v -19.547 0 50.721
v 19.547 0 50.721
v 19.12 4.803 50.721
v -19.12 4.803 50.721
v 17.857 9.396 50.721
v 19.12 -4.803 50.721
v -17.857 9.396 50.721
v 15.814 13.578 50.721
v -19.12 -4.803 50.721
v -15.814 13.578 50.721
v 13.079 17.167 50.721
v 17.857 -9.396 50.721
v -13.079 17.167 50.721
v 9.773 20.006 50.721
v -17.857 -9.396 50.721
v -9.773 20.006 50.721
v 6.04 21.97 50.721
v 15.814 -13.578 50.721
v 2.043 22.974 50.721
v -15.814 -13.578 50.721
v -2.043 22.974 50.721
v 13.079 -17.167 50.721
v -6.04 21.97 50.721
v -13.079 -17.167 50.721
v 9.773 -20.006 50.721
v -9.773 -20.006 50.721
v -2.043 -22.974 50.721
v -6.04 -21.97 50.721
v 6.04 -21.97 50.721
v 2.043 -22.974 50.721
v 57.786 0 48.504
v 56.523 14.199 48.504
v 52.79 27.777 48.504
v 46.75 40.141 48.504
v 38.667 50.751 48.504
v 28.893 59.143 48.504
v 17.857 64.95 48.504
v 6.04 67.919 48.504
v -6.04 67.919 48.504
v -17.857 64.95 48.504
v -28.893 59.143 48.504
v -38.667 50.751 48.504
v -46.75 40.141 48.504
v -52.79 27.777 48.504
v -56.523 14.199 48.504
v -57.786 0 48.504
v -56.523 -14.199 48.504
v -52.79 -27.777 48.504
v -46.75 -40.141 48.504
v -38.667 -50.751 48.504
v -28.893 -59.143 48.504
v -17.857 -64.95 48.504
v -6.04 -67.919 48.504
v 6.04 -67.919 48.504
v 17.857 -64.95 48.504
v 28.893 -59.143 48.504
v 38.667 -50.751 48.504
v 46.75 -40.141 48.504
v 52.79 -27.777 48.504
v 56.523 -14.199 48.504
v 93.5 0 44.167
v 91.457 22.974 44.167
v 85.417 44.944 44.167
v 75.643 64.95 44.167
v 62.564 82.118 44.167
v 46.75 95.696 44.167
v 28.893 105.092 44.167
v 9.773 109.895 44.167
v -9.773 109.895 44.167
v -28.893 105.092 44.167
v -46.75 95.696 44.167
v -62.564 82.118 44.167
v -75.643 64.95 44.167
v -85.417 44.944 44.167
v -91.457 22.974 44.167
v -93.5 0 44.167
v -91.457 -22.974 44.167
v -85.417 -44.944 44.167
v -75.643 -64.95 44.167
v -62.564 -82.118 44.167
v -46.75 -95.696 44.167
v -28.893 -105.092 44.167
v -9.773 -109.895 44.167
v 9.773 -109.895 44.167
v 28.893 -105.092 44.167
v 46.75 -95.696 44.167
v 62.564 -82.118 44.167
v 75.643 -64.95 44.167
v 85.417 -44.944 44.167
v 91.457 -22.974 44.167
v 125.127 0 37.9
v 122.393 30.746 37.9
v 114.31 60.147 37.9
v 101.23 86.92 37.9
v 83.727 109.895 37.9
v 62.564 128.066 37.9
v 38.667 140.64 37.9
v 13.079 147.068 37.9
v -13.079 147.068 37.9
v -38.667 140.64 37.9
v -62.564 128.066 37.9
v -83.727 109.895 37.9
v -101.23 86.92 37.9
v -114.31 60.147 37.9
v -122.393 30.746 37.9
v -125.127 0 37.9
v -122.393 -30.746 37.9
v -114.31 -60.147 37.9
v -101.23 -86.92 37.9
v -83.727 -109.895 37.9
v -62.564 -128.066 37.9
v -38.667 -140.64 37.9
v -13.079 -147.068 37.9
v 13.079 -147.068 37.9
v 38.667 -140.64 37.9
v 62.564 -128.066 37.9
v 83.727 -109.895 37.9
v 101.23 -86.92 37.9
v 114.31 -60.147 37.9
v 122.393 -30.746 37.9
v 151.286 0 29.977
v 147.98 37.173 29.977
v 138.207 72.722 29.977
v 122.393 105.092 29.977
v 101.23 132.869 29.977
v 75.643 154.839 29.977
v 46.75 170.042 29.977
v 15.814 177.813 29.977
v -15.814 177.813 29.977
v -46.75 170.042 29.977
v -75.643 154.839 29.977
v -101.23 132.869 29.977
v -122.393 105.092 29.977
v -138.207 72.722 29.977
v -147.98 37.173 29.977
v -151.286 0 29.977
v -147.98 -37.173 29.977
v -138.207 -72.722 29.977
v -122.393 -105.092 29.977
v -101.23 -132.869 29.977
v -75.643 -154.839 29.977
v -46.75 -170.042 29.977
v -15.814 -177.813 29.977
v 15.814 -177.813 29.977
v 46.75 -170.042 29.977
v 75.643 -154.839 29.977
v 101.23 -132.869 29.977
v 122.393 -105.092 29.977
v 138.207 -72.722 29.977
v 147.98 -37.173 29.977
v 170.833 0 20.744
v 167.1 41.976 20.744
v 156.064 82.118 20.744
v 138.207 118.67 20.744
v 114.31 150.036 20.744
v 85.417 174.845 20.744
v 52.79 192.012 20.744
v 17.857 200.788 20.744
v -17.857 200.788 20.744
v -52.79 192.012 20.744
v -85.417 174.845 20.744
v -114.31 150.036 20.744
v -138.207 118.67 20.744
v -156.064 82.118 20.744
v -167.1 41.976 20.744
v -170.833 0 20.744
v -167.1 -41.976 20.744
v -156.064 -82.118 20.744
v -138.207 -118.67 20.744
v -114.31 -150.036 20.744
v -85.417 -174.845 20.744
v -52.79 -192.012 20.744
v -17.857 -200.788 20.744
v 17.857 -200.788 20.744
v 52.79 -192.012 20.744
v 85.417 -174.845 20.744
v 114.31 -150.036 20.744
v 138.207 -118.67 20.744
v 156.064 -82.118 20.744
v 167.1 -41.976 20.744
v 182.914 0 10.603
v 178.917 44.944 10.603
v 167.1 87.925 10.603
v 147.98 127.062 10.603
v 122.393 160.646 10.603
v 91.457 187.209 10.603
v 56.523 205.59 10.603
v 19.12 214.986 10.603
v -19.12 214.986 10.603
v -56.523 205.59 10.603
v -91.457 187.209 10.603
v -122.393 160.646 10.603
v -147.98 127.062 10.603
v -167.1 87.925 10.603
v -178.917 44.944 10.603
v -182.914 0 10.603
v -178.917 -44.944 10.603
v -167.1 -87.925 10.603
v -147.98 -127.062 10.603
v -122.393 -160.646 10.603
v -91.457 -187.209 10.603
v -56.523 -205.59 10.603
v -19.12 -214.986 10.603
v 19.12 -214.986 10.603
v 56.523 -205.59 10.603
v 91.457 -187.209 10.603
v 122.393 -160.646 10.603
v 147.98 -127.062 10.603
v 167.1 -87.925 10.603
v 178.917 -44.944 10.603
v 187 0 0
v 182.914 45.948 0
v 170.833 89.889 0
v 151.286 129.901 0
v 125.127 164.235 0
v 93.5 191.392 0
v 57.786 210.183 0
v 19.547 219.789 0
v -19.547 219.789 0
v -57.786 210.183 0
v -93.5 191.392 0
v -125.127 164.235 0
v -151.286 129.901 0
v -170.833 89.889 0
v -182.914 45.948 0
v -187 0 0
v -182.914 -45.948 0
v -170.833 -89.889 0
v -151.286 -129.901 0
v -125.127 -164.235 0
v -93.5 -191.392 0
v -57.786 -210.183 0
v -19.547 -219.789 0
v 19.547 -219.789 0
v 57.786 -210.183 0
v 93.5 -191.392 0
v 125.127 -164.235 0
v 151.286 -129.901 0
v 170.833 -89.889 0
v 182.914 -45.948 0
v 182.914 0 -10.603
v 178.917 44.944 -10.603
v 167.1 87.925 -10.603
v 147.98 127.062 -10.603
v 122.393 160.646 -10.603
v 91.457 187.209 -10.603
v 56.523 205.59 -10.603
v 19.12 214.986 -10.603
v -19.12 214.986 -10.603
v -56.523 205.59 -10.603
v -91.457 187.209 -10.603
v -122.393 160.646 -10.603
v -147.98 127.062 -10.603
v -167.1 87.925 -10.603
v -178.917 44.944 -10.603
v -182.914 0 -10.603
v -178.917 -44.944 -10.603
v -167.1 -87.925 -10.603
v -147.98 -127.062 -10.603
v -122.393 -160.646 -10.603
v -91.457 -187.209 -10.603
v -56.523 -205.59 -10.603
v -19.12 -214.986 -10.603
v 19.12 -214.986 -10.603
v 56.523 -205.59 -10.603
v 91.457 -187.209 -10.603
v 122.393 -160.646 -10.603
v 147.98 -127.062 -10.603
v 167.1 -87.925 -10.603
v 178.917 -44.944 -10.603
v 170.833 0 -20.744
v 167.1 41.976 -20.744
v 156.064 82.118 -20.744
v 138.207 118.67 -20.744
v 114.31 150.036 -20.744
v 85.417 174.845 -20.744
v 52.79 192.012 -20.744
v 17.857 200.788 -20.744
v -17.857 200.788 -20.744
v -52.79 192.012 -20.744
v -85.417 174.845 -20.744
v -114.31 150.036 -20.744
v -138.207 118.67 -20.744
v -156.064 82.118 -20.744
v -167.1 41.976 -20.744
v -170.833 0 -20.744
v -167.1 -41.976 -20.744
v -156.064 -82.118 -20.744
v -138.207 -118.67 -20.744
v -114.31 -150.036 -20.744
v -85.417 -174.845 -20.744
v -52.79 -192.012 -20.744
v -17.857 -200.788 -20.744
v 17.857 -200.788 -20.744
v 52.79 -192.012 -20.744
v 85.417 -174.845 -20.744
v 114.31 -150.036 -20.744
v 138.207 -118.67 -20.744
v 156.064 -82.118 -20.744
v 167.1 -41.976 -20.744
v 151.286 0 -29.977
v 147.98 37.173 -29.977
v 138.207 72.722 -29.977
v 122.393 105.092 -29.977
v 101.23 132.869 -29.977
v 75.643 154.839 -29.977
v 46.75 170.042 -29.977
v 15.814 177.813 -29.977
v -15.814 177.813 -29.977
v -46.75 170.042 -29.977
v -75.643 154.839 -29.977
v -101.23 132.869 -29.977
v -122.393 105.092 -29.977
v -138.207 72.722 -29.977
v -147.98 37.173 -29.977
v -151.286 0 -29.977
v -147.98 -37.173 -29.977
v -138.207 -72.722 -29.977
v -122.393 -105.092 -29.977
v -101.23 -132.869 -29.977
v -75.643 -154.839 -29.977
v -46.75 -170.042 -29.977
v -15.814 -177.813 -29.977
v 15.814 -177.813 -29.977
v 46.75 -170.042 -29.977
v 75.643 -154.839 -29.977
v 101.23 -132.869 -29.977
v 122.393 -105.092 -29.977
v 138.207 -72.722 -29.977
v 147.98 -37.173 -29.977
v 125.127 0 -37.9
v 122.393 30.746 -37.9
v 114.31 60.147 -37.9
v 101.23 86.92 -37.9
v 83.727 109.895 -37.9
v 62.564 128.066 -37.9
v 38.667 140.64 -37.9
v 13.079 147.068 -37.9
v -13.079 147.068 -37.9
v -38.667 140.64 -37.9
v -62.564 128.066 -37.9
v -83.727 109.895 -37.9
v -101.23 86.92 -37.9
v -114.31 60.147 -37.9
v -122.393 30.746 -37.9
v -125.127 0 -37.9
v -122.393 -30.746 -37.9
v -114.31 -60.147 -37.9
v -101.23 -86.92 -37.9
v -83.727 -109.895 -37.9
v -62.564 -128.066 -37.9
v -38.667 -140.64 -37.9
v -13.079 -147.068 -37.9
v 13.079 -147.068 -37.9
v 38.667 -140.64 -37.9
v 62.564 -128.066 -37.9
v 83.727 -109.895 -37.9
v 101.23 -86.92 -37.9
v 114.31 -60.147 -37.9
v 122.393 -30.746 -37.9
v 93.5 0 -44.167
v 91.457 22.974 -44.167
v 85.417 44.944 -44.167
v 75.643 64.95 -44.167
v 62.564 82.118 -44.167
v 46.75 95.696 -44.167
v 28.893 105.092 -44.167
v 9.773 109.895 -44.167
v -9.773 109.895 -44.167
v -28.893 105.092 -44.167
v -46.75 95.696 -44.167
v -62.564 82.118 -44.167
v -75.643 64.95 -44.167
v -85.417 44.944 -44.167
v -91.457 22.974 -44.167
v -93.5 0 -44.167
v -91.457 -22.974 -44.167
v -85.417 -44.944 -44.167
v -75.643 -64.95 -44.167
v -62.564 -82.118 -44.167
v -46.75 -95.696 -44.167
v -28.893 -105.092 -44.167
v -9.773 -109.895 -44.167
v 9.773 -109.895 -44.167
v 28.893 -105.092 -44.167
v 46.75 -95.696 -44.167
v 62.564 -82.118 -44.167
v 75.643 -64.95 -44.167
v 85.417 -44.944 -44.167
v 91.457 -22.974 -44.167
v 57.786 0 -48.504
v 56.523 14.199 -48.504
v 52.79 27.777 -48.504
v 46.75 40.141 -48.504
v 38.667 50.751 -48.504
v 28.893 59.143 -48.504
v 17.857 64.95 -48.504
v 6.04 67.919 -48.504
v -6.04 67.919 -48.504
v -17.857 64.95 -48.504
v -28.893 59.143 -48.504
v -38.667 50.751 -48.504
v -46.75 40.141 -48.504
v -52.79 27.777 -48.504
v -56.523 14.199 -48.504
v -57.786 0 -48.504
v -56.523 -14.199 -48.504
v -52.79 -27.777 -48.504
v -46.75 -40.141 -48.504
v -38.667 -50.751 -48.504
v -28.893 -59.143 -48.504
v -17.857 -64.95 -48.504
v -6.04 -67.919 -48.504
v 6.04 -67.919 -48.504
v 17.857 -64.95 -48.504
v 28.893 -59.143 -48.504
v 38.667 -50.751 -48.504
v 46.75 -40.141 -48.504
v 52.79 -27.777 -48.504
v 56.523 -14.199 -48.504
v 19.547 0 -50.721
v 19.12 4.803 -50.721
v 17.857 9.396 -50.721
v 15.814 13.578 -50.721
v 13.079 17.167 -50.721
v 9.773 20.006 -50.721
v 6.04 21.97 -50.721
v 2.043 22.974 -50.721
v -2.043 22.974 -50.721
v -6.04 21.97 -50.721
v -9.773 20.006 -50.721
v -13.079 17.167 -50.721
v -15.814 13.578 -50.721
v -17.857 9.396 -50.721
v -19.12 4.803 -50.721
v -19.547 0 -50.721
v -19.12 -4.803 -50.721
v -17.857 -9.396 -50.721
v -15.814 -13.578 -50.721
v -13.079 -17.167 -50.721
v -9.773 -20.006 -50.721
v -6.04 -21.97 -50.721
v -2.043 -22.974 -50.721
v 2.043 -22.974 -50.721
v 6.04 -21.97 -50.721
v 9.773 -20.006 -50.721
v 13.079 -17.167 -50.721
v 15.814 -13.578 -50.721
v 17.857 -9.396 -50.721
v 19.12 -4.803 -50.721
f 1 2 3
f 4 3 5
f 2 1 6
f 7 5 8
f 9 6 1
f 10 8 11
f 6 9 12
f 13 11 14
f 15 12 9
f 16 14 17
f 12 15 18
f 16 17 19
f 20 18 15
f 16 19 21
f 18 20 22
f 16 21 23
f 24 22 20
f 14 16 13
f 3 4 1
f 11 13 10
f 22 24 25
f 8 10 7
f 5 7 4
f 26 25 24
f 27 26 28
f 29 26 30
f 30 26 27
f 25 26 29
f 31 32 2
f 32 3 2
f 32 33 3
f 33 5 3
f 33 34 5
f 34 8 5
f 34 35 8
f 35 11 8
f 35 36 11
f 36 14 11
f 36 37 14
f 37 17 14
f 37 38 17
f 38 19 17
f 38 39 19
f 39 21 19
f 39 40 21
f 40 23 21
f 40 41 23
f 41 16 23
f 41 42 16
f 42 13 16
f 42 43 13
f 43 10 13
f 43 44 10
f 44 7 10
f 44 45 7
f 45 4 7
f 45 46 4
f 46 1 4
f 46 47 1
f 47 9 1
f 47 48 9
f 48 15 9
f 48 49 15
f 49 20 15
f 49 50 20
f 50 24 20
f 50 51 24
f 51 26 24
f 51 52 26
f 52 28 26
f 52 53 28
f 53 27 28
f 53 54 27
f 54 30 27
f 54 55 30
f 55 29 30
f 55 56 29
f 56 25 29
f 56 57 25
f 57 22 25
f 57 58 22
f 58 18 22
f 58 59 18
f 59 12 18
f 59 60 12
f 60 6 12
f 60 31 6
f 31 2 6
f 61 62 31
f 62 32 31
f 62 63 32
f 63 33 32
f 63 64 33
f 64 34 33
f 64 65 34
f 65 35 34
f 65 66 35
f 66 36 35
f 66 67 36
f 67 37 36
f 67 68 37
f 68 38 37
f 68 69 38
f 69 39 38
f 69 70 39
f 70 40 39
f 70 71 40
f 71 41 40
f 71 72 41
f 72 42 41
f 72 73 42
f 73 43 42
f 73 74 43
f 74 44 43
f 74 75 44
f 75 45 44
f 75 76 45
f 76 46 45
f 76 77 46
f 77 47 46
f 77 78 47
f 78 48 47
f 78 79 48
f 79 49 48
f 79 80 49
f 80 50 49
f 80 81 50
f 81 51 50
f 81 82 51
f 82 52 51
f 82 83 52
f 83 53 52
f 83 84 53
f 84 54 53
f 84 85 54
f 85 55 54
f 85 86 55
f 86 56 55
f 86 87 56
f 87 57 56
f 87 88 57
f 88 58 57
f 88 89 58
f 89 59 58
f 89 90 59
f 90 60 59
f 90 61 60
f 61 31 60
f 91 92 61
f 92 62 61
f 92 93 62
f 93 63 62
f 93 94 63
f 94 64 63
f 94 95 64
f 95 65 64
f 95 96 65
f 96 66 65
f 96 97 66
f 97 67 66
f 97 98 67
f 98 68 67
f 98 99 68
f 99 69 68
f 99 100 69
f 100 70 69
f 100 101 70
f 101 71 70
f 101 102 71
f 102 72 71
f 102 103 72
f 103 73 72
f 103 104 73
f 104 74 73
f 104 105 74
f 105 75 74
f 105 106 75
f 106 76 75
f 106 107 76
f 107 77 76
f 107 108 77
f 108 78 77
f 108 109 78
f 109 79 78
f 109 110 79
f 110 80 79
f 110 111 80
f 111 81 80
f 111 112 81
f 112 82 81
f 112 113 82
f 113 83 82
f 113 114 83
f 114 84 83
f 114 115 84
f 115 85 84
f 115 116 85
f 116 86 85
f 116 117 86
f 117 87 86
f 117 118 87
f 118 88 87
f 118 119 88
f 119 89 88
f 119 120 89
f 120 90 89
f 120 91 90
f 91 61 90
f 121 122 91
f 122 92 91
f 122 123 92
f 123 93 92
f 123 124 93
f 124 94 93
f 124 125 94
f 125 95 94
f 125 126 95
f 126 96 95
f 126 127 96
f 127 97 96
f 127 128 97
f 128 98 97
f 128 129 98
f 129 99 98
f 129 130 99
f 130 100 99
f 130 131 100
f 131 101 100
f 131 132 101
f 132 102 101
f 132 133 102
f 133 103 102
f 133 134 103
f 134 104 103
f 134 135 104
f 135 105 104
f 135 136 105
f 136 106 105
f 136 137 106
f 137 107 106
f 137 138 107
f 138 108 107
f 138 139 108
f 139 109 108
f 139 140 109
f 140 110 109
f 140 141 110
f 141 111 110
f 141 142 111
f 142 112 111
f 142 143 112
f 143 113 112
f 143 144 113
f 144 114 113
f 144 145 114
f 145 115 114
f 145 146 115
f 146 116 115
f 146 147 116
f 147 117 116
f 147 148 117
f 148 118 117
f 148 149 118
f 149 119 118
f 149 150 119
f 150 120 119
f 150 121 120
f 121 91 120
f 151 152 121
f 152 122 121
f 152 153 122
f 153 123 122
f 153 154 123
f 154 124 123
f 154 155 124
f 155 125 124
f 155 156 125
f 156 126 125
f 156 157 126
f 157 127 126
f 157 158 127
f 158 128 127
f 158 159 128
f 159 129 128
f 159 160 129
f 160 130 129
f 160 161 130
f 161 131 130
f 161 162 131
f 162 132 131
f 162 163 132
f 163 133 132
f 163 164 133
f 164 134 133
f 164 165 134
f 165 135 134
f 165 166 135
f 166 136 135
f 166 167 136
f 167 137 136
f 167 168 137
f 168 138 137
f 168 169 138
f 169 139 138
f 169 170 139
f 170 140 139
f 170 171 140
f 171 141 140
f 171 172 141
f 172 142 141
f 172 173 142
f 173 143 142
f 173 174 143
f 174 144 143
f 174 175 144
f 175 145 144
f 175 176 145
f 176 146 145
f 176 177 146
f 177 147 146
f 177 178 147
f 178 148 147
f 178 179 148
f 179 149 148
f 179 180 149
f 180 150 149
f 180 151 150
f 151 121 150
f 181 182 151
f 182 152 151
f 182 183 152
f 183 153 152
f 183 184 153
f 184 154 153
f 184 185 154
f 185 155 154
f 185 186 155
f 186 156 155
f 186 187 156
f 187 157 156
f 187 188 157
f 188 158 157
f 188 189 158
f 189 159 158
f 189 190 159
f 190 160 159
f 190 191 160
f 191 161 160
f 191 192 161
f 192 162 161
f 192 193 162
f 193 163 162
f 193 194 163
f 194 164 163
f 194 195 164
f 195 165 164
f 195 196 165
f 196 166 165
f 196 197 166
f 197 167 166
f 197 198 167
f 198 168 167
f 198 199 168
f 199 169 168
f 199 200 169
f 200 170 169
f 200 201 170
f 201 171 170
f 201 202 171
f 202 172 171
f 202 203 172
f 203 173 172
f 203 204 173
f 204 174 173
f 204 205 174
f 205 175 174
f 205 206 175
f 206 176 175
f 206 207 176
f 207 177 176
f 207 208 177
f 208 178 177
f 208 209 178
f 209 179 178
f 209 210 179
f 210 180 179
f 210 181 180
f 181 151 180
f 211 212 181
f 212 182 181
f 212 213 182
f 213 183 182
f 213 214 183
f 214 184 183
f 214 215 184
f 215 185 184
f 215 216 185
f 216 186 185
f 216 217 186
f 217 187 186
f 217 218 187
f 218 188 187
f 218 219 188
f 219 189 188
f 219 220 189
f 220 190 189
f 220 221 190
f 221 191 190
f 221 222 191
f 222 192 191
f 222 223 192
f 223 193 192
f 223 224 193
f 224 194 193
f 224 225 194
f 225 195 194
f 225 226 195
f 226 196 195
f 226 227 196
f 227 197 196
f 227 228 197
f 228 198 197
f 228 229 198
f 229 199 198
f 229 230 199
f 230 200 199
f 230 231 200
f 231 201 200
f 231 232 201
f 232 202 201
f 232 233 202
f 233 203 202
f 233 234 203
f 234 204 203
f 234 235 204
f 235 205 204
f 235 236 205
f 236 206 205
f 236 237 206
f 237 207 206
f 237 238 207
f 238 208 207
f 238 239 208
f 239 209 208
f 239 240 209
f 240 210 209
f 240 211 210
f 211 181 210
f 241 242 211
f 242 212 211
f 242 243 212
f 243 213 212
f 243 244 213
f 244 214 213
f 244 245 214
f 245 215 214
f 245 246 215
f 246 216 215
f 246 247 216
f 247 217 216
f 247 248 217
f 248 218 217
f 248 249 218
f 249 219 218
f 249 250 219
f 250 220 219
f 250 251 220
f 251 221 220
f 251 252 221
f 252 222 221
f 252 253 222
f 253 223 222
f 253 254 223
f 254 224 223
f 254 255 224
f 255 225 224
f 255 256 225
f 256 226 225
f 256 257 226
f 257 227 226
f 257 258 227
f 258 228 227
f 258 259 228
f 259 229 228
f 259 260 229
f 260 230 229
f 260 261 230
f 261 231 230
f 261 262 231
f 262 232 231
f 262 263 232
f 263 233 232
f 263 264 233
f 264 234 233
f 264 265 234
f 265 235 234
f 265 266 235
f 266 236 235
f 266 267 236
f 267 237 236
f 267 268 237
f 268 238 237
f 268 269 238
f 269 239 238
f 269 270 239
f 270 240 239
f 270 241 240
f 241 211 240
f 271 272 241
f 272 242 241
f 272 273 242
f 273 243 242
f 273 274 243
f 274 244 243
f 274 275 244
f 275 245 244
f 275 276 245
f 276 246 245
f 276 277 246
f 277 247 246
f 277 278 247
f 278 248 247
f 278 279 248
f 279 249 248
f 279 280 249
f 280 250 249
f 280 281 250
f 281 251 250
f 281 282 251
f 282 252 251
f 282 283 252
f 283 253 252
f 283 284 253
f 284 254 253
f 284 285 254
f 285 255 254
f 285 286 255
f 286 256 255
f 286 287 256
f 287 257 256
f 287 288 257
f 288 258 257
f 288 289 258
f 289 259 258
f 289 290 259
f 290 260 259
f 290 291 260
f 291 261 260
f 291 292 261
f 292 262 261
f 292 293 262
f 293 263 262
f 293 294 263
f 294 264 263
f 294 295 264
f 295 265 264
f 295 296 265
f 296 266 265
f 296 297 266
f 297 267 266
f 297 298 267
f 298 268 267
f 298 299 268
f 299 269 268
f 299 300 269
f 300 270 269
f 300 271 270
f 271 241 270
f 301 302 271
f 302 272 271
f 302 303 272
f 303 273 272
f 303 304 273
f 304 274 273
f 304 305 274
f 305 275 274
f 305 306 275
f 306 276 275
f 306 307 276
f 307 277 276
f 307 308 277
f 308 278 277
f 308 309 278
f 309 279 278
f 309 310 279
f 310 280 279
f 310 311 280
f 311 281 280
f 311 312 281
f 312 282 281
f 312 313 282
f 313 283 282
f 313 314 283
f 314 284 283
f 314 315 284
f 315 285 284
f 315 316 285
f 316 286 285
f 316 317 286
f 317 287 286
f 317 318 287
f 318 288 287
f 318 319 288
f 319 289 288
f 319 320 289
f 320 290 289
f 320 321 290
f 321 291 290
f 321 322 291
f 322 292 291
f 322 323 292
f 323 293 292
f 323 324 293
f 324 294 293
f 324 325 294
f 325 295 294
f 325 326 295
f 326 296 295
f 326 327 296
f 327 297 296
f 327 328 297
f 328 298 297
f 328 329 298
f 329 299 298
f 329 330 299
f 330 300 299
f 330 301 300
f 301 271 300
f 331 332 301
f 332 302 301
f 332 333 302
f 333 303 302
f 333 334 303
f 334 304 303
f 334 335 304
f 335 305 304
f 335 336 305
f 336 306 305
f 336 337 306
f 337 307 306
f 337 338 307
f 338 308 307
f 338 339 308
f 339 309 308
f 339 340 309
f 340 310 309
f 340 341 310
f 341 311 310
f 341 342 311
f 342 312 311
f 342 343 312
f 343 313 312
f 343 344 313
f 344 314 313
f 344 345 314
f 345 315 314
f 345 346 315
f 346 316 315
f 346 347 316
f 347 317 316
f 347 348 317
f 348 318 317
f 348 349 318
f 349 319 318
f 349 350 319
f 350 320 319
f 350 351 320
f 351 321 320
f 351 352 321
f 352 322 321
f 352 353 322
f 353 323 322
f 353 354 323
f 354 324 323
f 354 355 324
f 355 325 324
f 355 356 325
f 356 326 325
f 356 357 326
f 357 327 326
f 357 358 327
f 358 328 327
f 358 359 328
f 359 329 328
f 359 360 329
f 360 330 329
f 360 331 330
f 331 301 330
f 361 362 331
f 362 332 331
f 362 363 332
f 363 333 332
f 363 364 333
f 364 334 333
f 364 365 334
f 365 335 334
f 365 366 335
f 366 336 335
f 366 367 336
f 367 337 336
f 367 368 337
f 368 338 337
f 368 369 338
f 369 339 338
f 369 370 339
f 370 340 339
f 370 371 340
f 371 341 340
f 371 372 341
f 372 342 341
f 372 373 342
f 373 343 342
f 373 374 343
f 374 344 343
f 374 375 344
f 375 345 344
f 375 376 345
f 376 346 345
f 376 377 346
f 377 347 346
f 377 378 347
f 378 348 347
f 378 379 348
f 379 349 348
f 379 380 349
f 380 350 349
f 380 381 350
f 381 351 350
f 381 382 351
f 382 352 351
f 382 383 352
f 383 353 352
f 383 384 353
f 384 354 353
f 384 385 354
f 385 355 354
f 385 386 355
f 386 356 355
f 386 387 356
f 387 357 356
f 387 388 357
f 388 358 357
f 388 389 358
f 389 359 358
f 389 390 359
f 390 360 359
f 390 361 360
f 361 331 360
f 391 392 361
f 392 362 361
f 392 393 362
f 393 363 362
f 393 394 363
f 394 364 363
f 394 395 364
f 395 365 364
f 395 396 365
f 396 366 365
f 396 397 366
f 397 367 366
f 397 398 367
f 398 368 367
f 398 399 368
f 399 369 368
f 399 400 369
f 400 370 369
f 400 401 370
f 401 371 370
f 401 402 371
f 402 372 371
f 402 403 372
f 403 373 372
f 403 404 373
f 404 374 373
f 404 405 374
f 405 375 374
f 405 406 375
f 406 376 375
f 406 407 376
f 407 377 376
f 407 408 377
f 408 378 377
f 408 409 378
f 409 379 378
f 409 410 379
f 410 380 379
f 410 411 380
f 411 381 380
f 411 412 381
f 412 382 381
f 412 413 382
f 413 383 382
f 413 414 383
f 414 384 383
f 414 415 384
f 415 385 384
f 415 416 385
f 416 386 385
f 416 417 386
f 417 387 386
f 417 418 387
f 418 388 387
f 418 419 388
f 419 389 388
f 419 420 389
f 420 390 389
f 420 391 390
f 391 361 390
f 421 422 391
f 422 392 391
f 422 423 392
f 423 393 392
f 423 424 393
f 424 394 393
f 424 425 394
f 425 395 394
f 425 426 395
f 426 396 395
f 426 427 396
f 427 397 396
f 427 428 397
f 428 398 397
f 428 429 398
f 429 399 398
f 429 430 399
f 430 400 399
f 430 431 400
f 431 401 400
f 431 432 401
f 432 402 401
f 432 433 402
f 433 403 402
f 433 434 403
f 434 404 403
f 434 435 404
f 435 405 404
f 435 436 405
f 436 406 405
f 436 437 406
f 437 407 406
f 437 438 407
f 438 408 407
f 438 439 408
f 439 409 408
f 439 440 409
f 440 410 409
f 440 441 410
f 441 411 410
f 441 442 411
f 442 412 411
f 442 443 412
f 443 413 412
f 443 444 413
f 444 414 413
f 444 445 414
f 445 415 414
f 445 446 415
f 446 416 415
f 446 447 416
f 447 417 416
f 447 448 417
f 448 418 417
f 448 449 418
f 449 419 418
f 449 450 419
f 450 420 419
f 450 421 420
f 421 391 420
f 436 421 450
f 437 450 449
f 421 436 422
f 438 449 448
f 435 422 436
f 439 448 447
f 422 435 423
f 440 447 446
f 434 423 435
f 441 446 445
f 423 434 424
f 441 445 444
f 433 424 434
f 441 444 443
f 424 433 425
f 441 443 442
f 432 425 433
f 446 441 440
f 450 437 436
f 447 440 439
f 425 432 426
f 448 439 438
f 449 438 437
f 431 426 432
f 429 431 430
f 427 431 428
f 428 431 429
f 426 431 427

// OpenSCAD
// Generated by SolidPython 1.0.1 on 2020-07-29 00:46:49


scale(v = [11, 13, 3]) {
	sphere(r = 17);
}
/***********************************************
*********      SolidPython code:      **********
************************************************
 
# import packages: SolidPython
from solid import *
from solid.utils import *
from itertools import chain, combinations, permutations


class Resize:

    def __init__(self, scad_file):
        self.scad_file = scad_file
        #self.scad_file = import_scad(scad_file)
        # cone/cylinder param:
        self.r1 = 0
        self.r2 = 0
        self.h = 0
        # rectangular prism param:
        self.w = 0
        self.l = 0
        # ellipse param:
        self.r = 0

    # import OpenScad code (file name corresponds to shape)


    # classify shape + parameters
    def assign(self, param1, param2, param3):
        if self.scad_file == 'cone.scad':
            self.r1 = param1
            self.r2 = param2
            self.h = param3
        elif self.scad_file == 'cylinder.scad':
            self.r1 = param1
            self.r2 = param2
            self.h = param3
        elif self.scad_file == 'rectangularPrism.scad':
            self.h = param1
            self.l = param2
            self.w = param3
        else:
            self.r = param1
            self.h = param2

    # resize parameters
    def iterate(self):
        x = range(3, 20, 2)
        i = 1
        if self.scad_file == 'cone.scad':
            tempList = list(permutations(x, 2))
            for temp in tempList:
                param1 = temp[0]
                param2 = temp[1]
                filepath = 'produced_scad_files/' + 'cone' + str(param1) + '_' + str(param2) + '_' + '.scad'
                scad_render_to_file(cylinder(h=param1, r1=param2, r2=0), filepath)

        elif self.scad_file == 'cylinder.scad':
            tempList = list(permutations(x, 3))
            for temp in tempList:
                param1 = temp[0]
                param2 = temp[1]
                filepath = 'produced_scad_files/' + 'cylinder' + str(param1) + '_' + str(param2) + '_' + '.scad'
                scad_render_to_file(cylinder(h=param1, r1=param2, r2=param2), filepath)

        elif self.scad_file == 'rectangularPrism.scad':
            tempList = list(permutations(x, 3))
            for temp in tempList:
                param1 = temp[0]
                param2 = temp[1]
                param3 = temp[2]
                filepath = 'produced_scad_files/' + 'rectangularPrism' + str(param1) + '_' + str(param2) + '_' + str(
                    param3) + '.scad'
                scad_render_to_file(cube(size=(param1, param2, param3)), filepath)

        elif self.scad_file == 'ellipse.scad':
            tempList = list(permutations(x, 4))
            for temp in tempList:
                param1 = temp[0]
                param2 = temp[1]
                param3 = temp[2]
                param4 = temp[3]
                filepath = 'produced_scad_files/' + 'ellipse' + str(param1) + '_' + str(param2) + '_' + str(param3) + '_' + str(param4) + '.scad'
                scad_render_to_file(scale([param1, param2, param3])(sphere(r=param4)), filepath)

    def render_to_scadfile(self):
        scad_render_to_file(scad, 'example.scad') 
 
************************************************/
